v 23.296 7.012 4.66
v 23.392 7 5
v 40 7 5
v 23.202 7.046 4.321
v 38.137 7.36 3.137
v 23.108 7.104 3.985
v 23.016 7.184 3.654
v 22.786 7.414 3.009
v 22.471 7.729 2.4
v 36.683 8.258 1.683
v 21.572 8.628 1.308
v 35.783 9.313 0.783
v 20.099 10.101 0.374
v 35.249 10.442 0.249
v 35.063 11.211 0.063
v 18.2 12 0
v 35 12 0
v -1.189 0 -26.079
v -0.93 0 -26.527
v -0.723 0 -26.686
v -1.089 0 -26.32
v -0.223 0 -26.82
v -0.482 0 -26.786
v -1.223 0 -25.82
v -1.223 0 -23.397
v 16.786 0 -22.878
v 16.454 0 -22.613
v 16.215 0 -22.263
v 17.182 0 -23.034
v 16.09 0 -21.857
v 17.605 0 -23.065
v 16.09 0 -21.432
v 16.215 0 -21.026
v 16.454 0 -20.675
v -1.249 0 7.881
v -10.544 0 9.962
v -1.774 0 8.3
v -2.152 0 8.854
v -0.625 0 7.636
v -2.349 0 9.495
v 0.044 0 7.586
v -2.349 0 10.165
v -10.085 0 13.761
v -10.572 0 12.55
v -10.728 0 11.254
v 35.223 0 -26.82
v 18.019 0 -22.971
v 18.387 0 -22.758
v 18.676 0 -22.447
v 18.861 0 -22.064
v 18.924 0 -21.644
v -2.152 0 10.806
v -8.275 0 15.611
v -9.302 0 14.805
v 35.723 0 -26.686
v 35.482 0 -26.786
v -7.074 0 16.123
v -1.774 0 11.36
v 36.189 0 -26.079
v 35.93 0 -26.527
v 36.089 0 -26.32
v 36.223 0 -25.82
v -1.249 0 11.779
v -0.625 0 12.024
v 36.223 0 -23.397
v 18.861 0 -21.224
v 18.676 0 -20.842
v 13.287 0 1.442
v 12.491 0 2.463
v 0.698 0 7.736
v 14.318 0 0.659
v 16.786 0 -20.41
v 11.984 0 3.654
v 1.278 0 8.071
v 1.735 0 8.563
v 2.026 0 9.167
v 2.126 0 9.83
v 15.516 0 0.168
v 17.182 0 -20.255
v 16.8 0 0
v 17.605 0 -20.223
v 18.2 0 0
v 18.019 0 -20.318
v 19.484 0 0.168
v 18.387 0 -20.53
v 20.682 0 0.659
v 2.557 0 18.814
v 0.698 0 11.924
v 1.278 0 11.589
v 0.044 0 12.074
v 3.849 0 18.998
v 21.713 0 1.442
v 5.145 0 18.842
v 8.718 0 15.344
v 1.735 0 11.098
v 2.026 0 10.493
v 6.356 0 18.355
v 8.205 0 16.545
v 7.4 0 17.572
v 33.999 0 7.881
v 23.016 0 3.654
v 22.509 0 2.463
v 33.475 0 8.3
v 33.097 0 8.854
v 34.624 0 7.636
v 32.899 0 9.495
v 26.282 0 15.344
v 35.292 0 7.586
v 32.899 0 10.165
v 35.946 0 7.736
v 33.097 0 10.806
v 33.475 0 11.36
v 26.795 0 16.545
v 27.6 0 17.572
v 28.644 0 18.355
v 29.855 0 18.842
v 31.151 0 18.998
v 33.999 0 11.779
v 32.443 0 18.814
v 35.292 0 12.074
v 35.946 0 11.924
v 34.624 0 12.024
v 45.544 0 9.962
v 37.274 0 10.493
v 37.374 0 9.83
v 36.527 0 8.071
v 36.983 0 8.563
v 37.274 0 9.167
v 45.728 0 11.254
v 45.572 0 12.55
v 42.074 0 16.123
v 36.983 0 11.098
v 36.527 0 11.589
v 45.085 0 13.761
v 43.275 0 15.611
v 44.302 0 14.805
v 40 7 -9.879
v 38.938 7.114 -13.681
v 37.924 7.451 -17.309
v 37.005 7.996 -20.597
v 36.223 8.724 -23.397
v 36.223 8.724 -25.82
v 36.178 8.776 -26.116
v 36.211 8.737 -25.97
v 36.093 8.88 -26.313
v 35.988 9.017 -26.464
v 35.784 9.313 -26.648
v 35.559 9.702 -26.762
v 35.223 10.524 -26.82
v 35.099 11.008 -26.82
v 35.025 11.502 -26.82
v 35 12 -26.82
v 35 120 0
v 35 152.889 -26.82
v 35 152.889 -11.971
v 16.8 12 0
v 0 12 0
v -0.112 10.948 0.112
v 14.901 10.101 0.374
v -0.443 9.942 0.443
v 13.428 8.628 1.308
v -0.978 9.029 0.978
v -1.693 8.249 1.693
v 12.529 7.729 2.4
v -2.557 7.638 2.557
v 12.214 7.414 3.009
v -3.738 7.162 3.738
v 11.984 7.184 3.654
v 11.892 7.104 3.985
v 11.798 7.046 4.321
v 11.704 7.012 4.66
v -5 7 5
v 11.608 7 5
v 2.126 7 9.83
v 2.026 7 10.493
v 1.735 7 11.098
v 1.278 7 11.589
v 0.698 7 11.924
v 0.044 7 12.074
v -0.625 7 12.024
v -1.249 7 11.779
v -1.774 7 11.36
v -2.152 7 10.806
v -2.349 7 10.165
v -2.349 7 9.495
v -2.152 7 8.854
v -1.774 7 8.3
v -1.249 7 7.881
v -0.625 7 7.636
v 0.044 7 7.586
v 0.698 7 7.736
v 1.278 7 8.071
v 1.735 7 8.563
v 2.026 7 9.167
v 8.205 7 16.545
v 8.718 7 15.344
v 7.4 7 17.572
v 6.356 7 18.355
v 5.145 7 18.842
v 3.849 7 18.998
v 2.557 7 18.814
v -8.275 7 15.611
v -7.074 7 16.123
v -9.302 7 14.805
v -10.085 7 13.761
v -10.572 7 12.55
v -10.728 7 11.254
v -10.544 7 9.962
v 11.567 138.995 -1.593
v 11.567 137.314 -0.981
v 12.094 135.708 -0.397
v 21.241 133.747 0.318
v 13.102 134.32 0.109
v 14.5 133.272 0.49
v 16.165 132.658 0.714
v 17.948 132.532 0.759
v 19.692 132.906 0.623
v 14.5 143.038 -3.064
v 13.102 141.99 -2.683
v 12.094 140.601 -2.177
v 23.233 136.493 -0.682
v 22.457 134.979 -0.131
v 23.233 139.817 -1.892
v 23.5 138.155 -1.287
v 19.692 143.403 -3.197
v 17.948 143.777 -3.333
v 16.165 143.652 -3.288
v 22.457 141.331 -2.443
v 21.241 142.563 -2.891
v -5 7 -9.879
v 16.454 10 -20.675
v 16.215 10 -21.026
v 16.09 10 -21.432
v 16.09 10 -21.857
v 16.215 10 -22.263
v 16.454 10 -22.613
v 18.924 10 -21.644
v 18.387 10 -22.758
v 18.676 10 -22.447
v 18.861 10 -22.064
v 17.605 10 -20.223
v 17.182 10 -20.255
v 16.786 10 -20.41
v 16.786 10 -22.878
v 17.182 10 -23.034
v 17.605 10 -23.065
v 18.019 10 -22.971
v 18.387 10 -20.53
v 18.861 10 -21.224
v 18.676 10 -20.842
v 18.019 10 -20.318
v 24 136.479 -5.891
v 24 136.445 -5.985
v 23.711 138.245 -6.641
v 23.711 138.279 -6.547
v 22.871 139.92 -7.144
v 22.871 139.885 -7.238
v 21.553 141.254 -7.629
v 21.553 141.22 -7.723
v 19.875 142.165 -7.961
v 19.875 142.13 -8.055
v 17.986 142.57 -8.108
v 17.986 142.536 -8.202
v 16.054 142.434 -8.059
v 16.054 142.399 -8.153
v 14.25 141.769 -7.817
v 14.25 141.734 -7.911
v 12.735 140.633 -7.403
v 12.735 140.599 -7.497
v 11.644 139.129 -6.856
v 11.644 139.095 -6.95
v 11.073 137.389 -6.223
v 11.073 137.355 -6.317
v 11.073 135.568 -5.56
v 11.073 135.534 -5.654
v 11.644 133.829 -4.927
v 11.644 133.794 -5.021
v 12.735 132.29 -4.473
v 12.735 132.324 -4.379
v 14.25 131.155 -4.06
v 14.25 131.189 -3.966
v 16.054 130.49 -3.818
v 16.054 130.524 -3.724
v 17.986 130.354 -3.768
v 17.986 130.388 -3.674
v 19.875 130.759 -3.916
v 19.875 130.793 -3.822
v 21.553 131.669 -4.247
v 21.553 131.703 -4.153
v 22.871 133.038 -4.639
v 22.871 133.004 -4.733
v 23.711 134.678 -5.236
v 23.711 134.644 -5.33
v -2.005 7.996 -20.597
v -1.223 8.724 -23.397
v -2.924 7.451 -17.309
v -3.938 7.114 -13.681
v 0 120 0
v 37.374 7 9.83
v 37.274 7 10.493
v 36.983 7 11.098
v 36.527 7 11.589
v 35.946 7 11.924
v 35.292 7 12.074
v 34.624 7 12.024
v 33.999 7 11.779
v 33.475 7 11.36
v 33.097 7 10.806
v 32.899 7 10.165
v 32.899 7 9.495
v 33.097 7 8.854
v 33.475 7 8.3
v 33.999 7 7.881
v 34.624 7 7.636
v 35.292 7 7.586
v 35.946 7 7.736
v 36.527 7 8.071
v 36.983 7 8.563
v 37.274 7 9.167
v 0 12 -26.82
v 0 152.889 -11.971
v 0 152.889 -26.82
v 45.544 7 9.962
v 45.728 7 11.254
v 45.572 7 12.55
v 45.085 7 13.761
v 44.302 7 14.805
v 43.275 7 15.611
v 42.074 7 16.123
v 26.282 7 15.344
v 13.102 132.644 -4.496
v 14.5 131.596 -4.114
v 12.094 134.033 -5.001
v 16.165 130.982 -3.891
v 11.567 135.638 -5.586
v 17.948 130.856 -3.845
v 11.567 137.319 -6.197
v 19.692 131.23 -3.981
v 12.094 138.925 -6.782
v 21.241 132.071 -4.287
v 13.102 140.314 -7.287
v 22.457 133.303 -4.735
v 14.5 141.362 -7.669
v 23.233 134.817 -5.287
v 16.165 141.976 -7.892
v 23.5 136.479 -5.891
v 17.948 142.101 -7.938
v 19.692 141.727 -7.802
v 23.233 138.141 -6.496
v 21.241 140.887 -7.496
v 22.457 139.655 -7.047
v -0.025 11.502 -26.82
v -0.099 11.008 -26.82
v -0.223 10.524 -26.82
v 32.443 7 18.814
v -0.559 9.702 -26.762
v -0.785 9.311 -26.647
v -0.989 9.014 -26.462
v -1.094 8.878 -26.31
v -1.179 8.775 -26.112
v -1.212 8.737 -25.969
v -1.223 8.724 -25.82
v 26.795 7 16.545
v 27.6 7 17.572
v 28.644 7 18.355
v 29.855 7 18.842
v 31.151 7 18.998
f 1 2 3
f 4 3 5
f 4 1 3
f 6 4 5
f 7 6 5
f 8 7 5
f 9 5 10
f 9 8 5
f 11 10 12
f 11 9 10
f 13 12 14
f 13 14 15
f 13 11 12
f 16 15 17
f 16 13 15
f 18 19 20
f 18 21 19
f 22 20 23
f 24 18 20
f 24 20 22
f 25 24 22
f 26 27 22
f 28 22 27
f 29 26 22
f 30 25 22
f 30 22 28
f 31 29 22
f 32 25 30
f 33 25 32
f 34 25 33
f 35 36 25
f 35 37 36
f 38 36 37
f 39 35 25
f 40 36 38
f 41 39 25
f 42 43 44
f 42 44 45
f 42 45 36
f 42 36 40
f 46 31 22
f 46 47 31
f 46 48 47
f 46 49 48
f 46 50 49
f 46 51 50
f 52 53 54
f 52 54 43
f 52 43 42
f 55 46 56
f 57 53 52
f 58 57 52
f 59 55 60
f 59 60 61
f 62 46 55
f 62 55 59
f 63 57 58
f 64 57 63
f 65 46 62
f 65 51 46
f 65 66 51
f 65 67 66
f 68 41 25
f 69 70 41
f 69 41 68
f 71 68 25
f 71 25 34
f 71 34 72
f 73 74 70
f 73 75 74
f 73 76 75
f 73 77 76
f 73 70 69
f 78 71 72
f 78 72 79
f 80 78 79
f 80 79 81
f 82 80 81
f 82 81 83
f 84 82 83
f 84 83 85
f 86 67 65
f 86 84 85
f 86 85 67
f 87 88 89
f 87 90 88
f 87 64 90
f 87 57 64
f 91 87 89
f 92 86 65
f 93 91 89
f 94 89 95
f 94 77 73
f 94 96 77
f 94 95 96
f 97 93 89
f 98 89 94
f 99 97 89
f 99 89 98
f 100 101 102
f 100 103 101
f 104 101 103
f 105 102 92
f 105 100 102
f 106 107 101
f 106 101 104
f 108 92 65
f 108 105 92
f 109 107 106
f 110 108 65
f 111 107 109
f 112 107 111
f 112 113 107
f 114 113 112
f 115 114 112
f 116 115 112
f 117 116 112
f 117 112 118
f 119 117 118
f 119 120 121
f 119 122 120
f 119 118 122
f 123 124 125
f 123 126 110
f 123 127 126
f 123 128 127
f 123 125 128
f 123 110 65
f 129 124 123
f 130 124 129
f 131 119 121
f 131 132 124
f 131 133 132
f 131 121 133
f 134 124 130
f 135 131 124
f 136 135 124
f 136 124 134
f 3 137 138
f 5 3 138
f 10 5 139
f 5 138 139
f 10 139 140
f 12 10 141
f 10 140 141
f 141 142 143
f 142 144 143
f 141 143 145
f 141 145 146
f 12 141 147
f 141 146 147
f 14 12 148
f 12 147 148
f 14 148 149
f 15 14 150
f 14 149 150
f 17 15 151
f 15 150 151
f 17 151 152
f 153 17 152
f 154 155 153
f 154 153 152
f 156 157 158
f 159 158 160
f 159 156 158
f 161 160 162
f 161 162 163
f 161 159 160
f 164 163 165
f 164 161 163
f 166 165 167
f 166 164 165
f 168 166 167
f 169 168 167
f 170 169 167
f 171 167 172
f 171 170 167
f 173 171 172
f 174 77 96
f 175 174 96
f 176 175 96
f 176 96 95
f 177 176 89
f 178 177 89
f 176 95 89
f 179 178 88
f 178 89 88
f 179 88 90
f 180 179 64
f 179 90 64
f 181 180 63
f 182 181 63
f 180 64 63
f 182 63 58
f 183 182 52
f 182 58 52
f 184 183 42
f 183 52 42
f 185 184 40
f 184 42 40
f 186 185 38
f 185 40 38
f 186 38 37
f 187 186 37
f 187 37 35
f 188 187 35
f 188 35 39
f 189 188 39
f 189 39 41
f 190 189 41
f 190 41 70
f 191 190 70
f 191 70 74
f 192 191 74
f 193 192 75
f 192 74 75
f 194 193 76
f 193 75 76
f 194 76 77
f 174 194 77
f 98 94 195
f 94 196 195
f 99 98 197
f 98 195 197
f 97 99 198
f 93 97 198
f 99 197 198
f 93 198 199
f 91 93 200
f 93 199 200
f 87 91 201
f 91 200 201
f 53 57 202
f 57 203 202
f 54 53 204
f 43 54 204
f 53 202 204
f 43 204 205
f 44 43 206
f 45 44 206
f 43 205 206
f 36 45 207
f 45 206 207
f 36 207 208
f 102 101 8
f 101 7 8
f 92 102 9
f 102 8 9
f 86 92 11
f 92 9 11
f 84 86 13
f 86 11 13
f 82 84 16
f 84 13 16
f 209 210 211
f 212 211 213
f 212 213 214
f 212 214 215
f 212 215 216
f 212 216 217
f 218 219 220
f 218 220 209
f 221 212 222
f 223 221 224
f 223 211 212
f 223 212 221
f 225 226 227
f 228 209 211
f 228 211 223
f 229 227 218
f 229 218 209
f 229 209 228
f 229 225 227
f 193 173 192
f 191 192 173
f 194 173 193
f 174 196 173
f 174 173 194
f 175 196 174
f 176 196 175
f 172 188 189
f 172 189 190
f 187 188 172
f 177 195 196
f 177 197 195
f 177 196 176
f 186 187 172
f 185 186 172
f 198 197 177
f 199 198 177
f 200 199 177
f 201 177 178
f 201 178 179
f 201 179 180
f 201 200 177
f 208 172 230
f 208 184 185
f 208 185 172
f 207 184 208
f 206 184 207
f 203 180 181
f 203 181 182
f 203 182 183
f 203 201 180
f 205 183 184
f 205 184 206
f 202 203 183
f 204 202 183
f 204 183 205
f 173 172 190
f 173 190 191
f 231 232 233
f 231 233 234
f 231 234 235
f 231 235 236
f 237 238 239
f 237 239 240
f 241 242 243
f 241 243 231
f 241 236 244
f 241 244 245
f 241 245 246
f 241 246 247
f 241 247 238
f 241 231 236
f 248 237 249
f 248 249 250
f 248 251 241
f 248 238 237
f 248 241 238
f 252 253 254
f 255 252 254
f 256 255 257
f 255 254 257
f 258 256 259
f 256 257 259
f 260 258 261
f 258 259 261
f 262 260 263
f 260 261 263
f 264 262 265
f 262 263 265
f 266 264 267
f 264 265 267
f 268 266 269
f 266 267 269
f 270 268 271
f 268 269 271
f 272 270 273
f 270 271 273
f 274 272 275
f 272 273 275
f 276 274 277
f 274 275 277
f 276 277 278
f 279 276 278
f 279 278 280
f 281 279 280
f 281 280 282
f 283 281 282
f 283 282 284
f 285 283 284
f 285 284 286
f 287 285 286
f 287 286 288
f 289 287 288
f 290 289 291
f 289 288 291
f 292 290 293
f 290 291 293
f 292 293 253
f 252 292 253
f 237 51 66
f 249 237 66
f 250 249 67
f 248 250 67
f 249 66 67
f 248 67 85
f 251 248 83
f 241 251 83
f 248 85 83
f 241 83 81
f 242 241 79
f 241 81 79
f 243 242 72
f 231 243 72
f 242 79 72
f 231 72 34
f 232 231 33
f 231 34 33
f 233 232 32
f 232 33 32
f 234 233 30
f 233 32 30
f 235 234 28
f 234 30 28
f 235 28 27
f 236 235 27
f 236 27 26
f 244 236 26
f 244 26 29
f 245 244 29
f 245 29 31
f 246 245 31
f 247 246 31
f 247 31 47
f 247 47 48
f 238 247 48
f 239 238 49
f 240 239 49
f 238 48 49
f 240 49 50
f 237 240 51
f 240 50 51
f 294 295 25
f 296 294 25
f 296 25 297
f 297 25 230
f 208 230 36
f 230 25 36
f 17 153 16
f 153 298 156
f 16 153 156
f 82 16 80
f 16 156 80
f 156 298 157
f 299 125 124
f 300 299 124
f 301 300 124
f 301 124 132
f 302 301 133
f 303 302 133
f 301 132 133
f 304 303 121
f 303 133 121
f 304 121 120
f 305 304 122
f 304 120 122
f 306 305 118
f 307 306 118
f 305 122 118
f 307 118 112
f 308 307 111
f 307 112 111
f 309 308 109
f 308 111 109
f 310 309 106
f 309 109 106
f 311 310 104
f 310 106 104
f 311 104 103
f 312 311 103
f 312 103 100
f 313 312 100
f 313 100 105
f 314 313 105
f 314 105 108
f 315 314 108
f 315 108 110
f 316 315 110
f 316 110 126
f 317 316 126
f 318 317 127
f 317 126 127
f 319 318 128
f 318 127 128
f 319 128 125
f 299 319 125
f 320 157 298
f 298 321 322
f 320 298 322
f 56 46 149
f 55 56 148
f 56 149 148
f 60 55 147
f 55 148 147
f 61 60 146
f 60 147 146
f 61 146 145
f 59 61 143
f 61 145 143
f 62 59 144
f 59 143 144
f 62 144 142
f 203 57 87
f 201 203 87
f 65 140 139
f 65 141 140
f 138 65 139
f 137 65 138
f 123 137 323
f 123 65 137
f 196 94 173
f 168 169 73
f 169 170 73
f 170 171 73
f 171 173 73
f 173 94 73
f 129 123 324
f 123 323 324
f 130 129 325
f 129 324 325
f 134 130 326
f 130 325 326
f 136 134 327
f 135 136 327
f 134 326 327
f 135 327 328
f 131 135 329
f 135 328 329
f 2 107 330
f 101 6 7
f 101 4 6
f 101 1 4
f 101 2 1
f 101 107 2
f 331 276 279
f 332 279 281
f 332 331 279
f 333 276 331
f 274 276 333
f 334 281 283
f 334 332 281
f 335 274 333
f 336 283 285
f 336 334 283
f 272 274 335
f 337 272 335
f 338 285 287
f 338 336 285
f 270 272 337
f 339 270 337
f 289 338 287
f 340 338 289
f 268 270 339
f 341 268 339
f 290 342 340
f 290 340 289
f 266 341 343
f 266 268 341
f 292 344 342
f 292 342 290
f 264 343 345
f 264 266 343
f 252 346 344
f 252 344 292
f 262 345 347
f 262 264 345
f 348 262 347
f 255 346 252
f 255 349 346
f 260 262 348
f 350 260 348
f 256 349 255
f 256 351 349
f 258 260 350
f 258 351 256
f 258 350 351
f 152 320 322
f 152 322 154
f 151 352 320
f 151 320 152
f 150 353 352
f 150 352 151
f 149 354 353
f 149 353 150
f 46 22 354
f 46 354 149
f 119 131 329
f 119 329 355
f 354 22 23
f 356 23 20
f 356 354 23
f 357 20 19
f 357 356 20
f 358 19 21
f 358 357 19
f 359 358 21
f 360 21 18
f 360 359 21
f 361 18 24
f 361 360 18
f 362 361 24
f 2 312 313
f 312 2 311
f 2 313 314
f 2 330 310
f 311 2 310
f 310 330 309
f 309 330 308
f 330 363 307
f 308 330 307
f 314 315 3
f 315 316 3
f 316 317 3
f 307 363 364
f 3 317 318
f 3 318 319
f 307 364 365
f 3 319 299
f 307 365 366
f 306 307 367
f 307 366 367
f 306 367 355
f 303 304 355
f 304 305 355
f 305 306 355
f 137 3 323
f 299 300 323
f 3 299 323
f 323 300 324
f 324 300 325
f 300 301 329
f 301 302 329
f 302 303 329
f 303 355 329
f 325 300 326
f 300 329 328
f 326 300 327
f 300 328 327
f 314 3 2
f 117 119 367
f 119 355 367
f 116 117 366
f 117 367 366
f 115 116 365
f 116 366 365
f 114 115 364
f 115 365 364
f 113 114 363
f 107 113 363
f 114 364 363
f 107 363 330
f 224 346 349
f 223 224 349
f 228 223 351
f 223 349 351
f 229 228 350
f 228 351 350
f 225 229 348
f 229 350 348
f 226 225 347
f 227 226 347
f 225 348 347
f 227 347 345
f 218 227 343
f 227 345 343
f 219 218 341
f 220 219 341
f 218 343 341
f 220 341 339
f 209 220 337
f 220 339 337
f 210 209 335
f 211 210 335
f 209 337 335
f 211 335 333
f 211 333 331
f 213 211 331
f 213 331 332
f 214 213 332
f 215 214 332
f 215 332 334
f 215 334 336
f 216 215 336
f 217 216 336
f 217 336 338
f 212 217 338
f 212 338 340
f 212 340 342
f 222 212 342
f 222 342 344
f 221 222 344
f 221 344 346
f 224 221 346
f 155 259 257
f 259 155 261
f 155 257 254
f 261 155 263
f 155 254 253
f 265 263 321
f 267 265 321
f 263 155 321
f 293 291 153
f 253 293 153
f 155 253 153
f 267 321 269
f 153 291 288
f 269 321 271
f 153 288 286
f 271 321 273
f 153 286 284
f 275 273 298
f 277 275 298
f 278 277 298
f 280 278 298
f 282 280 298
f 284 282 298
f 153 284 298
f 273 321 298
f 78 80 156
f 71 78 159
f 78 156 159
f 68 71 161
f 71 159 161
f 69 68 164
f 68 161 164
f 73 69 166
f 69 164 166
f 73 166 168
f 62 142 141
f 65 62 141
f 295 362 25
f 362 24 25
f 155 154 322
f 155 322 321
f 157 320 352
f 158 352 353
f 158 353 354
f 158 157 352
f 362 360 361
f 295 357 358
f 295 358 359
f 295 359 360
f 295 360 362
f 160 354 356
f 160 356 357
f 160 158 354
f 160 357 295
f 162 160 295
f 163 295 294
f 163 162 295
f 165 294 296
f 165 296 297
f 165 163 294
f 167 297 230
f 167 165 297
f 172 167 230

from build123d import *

# Parameters (mm, degrees)
AUFSATZ_LINEAR_AUSTRAGEN1_DEPTH = 35
SKIZZE3_R                       = 6
AUFSATZ_LINEAR_AUSTRAGEN2_DEPTH = 5
SKIZZE4_R                       = 6.5
AUFSATZ_LINEAR_AUSTRAGEN3_DEPTH = 0.1
SKIZZE9_R                       = 1.425
SCHNITT_LINEAR_AUSTRAGEN2_DEPTH = 10
SKIZZE10_R                      = 2.25
AUFSATZ_LINEAR_AUSTRAGEN4_DEPTH = 7
VERRUNDUNG1_R                   = 5
VERRUNDUNG2_R                   = 1


with BuildPart() as part:
    # Skizze1 → Aufsatz-Linear austragen1 (new body)
    with BuildSketch(Plane(origin=(0, 0, 0), x_dir=(0, 0, -1), z_dir=(1, 0, 0))):
        Polygon((0, 0), (11.970705016, 0), (26.82, 0), (26.82, 152.889241728), (11.970705016, 152.889241728), (0, 120), align=None)
    extrude(amount=AUFSATZ_LINEAR_AUSTRAGEN1_DEPTH)

    # Skizze3 → Aufsatz-Linear austragen2 (add)
    with BuildSketch(Plane(origin=(0, 14.037333413, 38.567256581), x_dir=(1, 0, 0), z_dir=(0, 0.342020143, 0.939692621))):
        with Locations((17.5, 130.263114494)):
            Circle(SKIZZE3_R)
    extrude(amount=AUFSATZ_LINEAR_AUSTRAGEN2_DEPTH)

    # Skizze4 → Aufsatz-Linear austragen3 (add)
    with BuildSketch(Plane(origin=(0, 14.037333413, 38.567256581), x_dir=(1, 0, 0), z_dir=(0, 0.342020143, 0.939692621))):
        with Locations((17.5, 130.263114494)):
            Circle(SKIZZE4_R)
    extrude(amount=AUFSATZ_LINEAR_AUSTRAGEN3_DEPTH)

    # Skizze9 → Schnitt-Linear austragen2 (cut)
    with BuildSketch(Plane.XZ):
        with Locations((17.498844944, -21.644236877)):
            Circle(SKIZZE9_R)
    extrude(amount=-SCHNITT_LINEAR_AUSTRAGEN2_DEPTH, mode=Mode.SUBTRACT)

    # Skizze10 → Aufsatz-Linear austragen4 (add)
    with BuildSketch(Plane.XZ):
        Polygon((35, -26.82), (36.222689888, -26.82), (36.222689888, -23.396698607), (46.889907729, 14.777378017), (27.627810102, 20.159904842), (21.994403466, 0), align=None)
        with Locations((35.124354886, 9.830031101)):
            Circle(SKIZZE10_R, mode=Mode.SUBTRACT)
        Polygon((-1.222689888, -26.82), (-1.222689888, -23.396698607), (-11.889907729, 14.777378017), (7.372189898, 20.159904842), (13.005596534, 0), (0, -26.82), align=None)
        with Locations((-0.124354886, 9.830031101)):
            Circle(SKIZZE10_R, mode=Mode.SUBTRACT)
    extrude(amount=-AUFSATZ_LINEAR_AUSTRAGEN4_DEPTH)

    # Verrundung1
    verrundung1_edges = [part.edges().sort_by_distance(p)[0] for p in [
        (6.502798267, 7, 0),
        (28.497201733, 7, 0),
        (35, 7, -13.41),
        (0, 7, -13.41),
        (-11.889907729, 3.5, 14.777378017),
        (7.372189898, 3.5, 20.159904842),
        (46.889907729, 3.5, 14.777378017),
        (27.627810102, 3.5, 20.159904842),
        (21.994403466, 3.5, 0),
        (13.005596534, 3.5, 0),
    ]]
    fillet(verrundung1_edges, radius=VERRUNDUNG1_R)

    # Verrundung2
    verrundung2_edges = [part.edges().sort_by_distance(p)[0] for p in [
        (36.222689888, 4.362018901, -26.82),
        (-1.222689888, 4.362018901, -26.82),
    ]]
    fillet(verrundung2_edges, radius=VERRUNDUNG2_R)


solid = part.part
